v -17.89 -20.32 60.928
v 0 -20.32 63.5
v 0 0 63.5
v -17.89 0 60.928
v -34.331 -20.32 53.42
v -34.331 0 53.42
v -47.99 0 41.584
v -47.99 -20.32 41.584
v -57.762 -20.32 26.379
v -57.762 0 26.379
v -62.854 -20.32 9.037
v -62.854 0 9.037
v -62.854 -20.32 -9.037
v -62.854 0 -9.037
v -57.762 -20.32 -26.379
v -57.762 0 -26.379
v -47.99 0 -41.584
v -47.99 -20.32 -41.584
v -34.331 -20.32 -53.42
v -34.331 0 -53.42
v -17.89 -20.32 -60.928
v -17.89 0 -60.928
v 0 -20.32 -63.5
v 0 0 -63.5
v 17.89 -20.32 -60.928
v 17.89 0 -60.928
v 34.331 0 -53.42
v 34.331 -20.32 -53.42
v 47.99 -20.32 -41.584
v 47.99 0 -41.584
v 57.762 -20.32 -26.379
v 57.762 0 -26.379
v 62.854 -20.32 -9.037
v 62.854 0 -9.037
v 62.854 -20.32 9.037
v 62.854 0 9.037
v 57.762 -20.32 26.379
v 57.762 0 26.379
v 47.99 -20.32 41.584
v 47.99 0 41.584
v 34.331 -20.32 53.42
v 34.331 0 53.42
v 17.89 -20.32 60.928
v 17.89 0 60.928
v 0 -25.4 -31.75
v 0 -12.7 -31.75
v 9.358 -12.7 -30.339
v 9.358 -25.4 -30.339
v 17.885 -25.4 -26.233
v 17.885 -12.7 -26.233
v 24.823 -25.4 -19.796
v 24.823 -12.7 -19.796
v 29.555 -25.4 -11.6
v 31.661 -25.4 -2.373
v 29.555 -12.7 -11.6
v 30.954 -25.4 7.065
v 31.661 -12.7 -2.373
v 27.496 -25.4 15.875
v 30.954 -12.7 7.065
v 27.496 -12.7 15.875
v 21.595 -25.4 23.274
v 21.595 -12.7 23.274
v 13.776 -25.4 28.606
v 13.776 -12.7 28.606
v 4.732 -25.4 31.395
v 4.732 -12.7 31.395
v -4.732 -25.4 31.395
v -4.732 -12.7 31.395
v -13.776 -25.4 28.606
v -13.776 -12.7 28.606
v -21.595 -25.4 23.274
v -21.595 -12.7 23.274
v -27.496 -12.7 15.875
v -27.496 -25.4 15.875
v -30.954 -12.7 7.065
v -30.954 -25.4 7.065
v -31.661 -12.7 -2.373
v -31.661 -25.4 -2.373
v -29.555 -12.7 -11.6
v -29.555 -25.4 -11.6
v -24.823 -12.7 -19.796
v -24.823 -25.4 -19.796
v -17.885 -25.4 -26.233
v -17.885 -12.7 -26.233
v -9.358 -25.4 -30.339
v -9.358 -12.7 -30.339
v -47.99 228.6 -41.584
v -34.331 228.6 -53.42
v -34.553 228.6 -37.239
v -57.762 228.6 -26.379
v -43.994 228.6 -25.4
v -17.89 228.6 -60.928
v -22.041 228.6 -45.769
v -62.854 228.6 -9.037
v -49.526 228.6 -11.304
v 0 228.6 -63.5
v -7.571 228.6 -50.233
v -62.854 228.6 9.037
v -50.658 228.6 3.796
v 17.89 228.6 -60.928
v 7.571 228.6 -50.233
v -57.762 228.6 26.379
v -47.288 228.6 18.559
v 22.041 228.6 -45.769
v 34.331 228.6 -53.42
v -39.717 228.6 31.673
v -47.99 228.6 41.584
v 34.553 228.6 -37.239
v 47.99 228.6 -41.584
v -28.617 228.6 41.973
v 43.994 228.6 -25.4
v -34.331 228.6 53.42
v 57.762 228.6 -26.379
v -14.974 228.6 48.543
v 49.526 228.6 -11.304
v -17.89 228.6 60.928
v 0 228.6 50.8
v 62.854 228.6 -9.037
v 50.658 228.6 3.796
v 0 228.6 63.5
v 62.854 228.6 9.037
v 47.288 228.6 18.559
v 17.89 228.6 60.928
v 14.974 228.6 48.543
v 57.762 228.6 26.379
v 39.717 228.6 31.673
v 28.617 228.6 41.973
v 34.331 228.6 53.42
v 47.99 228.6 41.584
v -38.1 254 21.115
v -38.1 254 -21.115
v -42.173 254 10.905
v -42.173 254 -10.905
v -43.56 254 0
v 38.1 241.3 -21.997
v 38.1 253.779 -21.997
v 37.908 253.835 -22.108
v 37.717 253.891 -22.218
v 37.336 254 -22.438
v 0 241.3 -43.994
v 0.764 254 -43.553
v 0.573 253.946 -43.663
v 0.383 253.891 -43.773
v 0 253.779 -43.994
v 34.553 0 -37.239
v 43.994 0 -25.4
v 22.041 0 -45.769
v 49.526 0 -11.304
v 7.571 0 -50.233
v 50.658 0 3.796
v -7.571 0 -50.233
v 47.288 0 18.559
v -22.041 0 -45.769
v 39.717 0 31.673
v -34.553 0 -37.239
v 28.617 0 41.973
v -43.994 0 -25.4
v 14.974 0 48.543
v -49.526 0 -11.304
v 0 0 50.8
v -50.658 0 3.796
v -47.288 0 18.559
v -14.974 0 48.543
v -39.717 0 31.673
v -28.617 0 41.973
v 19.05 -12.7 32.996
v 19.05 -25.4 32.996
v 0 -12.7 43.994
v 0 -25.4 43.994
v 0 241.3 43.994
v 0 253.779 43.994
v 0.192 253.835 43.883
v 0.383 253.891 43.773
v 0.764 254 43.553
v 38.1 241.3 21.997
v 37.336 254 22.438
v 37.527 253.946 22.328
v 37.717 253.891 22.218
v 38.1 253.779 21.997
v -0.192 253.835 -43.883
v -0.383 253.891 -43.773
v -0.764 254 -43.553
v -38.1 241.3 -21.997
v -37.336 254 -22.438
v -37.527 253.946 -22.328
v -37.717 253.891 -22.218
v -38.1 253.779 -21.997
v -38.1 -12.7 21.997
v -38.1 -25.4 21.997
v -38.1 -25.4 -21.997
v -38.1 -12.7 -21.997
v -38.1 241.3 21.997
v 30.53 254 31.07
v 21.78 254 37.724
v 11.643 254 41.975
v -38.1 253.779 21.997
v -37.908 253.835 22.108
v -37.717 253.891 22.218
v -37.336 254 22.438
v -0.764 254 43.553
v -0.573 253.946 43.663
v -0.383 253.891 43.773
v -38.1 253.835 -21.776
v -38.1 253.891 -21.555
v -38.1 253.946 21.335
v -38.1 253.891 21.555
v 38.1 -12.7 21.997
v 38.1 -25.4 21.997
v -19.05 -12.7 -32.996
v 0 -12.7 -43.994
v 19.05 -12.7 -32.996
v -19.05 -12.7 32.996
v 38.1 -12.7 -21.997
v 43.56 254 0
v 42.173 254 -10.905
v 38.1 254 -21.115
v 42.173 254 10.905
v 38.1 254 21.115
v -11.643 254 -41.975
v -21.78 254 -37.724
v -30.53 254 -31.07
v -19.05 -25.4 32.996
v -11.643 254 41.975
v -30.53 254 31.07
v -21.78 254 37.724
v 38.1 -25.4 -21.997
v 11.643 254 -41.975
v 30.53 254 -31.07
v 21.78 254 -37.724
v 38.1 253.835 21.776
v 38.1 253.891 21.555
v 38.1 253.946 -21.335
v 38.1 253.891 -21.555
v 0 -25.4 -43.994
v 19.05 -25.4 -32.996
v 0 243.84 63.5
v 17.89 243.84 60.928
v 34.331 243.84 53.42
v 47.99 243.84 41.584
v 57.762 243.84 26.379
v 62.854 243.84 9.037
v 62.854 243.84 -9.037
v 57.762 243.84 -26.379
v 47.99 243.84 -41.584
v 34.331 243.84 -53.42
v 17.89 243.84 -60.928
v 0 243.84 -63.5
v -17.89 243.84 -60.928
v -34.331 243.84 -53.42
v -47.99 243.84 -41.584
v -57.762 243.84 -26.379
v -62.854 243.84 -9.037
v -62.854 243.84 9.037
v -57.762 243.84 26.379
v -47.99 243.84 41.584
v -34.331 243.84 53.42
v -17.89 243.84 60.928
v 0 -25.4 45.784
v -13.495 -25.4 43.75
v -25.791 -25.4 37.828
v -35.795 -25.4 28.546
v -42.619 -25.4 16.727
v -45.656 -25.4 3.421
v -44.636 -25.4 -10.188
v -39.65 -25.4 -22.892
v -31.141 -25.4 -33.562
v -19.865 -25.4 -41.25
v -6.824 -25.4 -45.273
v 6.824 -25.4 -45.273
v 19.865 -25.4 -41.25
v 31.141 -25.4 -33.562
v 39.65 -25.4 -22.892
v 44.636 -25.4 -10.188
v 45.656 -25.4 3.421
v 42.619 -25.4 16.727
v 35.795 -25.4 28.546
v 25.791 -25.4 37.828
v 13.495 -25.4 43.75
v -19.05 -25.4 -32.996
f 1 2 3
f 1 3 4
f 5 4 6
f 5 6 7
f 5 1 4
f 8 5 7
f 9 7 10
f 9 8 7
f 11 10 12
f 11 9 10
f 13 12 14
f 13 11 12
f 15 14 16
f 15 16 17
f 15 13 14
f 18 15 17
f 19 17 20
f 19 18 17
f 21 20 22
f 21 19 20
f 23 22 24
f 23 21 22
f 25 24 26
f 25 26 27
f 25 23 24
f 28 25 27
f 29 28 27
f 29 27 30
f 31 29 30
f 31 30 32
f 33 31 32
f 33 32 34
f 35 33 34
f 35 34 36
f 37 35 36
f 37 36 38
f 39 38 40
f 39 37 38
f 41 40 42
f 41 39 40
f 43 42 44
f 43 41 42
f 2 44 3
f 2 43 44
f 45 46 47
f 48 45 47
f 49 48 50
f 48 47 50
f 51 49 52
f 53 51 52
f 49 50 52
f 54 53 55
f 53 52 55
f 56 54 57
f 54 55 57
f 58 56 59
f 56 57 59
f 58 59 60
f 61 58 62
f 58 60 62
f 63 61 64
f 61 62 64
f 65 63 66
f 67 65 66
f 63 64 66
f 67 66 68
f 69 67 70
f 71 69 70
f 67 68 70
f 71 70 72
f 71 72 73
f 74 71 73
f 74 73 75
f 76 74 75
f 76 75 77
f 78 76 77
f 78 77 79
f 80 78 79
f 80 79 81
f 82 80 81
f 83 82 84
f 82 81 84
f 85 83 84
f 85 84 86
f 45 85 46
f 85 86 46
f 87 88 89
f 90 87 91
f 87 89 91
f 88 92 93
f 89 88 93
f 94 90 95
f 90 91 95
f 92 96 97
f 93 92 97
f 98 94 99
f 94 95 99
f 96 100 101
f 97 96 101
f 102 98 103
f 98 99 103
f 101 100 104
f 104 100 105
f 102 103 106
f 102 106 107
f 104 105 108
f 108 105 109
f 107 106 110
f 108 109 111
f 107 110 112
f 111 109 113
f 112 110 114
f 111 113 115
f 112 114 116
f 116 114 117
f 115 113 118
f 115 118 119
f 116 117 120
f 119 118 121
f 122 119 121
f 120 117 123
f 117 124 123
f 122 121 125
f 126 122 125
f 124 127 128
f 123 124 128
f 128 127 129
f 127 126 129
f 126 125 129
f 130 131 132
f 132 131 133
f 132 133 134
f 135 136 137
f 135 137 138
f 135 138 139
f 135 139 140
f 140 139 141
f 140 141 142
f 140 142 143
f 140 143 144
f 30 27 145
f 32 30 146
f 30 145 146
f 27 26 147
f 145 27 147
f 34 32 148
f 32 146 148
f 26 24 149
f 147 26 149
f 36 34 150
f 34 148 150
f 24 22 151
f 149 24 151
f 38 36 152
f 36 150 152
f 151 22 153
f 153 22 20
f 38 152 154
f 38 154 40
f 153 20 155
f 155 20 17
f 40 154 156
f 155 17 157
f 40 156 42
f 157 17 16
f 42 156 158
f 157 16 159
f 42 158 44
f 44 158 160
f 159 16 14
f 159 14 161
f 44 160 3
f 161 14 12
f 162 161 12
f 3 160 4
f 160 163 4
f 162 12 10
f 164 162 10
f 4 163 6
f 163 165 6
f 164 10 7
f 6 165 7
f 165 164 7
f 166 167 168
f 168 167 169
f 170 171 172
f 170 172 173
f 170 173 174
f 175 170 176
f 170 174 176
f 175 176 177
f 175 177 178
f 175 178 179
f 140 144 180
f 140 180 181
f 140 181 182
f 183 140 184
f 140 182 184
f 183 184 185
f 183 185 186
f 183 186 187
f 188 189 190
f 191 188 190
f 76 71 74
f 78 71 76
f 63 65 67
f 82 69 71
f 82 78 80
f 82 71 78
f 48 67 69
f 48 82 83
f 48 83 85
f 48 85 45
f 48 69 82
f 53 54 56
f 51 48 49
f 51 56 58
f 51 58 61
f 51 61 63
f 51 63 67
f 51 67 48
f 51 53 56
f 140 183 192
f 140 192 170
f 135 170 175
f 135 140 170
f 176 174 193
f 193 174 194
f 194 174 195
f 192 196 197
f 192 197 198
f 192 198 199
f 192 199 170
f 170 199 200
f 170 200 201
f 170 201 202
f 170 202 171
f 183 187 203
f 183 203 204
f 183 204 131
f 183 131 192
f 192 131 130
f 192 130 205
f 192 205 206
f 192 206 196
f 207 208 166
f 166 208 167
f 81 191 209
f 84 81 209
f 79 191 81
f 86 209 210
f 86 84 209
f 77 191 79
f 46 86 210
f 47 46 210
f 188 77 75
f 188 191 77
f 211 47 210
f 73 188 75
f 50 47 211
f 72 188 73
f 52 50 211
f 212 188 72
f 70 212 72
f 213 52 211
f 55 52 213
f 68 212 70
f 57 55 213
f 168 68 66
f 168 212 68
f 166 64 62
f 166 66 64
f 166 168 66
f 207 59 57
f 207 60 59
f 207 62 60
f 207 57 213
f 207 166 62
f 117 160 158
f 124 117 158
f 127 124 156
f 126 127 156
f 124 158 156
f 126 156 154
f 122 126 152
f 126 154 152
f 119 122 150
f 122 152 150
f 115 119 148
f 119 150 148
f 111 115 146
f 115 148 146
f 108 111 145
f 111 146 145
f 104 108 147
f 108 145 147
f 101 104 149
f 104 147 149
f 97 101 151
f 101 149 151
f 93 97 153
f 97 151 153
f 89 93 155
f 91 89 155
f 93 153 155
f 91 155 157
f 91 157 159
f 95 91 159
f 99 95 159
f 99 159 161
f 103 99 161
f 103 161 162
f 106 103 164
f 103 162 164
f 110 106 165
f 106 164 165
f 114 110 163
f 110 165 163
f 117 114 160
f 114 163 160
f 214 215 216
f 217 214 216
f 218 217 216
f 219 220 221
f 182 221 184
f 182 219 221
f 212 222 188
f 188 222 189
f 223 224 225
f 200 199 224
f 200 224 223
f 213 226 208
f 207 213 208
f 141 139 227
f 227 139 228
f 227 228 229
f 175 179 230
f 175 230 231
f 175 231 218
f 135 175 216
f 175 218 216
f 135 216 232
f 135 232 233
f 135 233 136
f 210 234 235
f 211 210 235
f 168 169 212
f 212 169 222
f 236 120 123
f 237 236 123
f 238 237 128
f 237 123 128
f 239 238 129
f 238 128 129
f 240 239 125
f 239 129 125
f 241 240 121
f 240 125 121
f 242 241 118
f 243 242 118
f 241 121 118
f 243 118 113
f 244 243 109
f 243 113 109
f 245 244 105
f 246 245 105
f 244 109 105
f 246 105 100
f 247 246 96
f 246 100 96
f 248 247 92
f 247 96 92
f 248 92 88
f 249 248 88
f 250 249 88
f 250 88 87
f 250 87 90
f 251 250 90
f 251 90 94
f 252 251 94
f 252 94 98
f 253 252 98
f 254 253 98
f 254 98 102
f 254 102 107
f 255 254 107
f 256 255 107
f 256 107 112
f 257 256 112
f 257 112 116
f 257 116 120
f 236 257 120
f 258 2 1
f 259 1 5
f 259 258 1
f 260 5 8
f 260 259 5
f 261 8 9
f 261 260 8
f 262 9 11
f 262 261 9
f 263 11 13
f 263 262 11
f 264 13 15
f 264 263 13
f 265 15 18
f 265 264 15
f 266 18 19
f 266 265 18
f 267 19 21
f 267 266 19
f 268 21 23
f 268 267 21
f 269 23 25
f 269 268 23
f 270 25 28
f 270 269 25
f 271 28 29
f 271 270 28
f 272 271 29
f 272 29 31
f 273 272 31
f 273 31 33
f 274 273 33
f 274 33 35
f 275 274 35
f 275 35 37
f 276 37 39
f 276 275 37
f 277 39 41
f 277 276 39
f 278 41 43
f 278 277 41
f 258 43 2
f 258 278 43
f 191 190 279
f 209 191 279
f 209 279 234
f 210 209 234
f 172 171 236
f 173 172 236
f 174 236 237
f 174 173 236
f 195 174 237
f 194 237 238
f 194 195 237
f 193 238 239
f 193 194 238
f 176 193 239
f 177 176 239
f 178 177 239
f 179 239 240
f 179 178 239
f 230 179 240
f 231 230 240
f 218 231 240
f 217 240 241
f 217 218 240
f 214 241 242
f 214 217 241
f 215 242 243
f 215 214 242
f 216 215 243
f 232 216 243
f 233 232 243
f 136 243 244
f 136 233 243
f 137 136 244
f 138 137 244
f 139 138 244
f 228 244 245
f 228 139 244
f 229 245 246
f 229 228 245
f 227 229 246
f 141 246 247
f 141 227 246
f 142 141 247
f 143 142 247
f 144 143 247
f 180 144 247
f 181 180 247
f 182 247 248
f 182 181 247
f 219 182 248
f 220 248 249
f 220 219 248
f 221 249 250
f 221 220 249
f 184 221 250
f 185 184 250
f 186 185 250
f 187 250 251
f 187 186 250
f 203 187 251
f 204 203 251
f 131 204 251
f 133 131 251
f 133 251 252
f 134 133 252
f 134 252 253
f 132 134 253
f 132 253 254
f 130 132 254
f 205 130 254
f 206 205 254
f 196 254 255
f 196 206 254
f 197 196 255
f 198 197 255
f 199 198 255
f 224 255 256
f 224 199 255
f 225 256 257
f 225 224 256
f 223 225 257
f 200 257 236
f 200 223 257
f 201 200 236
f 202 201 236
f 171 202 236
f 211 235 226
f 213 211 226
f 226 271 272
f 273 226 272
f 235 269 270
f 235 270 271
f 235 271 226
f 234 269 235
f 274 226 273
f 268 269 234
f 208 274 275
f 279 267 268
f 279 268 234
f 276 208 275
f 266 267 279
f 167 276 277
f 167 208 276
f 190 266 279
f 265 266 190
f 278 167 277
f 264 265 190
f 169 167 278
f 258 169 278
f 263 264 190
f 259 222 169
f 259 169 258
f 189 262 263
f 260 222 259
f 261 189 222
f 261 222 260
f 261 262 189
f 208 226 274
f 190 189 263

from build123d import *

# Parameters (mm, degrees)
SKETCH1_R           = 50.8
BOSS_EXTRUDE1_DEPTH = 228.6
SKETCH2_R           = 63.5
BOSS_EXTRUDE2_DEPTH = 25.4
BOSS_EXTRUDE3_START = 25.4
SKETCH3_R           = 63.5
BOSS_EXTRUDE3_DEPTH = 25.4
CUT_EXTRUDE2_DEPTH  = 12.7
CHAMFER2_SIZE       = 10.16
CHAMFER2_SIZE_2     = 19.940122736
SKETCH5_R           = 38.1
CUT_EXTRUDE5_DEPTH  = 12.7
CHAMFER3_SIZE       = 5.08
CHAMFER3_SIZE2      = 17.716065375
SKETCH6_R           = 31.75
BOSS_EXTRUDE6_DEPTH = 12.7


with BuildPart() as part:
    # Sketch1 → Boss-Extrude1 (new body)
    with BuildSketch(Plane(origin=(0, 0, 0), x_dir=(1, 0, 0), z_dir=(0, 1, 0))):
        with Locations(Location((0, 0, 0), (0, 0, 270))):
            Circle(SKETCH1_R)
    extrude(amount=BOSS_EXTRUDE1_DEPTH)

    # Sketch2 → Boss-Extrude2 (add)
    with BuildSketch(Plane(origin=(0, 228.6, 0), x_dir=(1, 0, 0), z_dir=(0, 1, 0))):
        with Locations(Location((0, 0, 0), (0, 0, 270))):
            Circle(SKETCH2_R)
    extrude(amount=BOSS_EXTRUDE2_DEPTH)

    # Sketch3 → Boss-Extrude3 (add)
    with BuildSketch(Plane.XZ.offset(BOSS_EXTRUDE3_START)):
        with Locations(Location((0, 0, 0), (0, 0, 90))):
            Circle(SKETCH3_R)
    extrude(amount=-BOSS_EXTRUDE3_DEPTH)

    # Sketch4 → Cut-Extrude2 (cut)
    with BuildSketch(Plane(origin=(0, 254, 0), x_dir=(1, 0, 0), z_dir=(0, 1, 0))):
        Polygon((0, 43.994090512), (-38.1, 21.997045256), (-38.1, -21.997045256), (0, -43.994090512), (38.1, -21.997045256), (38.1, 21.997045256), align=None)
    extrude(amount=-CUT_EXTRUDE2_DEPTH, mode=Mode.SUBTRACT)

    # Chamfer2
    # the kernel refuses this chamfer: 19.940122736, 10.16 mm, written as the material it takes off along each edge
    with BuildSketch(Plane(origin=(0, 254, 0), x_dir=(0, 0, 1), z_dir=(-1, 0, 0))) as chamfer2_piece_1:
        Polygon((63.5, -CHAMFER2_SIZE), (63.5 - CHAMFER2_SIZE_2, 0), (63.5, 0), align=None)
    revolve(axis=Axis((0, 254, 0), (0, 1, 0)), mode=Mode.SUBTRACT)

    # Sketch5 → Cut-Extrude5 (cut)
    with BuildSketch(Plane.XZ.offset(25.4)):
        Circle(SKETCH5_R)
        with BuildLine():
            Line((19.049999468, 32.995568191), (0, 43.994090512))
            Line((0, 43.994090512), (-19.04999937, 32.995568248))
            ThreePointArc((-19.04999937, 32.995568248), (5.7e-08, 38.1), (19.049999468, 32.995568191))
        make_face()
        with BuildLine():
            Line((38.1, 21.997045256), (19.049999468, 32.995568191))
            ThreePointArc((19.049999468, 32.995568191), (32.995567731, 19.050000266), (38.1, 0))
            Line((38.1, 0), (38.1, 21.997045256))
        make_face()
        with BuildLine():
            ThreePointArc((-38.1, -1.79e-07), (-32.995567747, 19.050000238), (-19.04999937, 32.995568248))
            Line((-19.04999937, 32.995568248), (-38.1, 21.997045256))
            Line((-38.1, 21.997045256), (-38.1, -1.79e-07))
        make_face()
        with BuildLine():
            ThreePointArc((-19.049999051, -32.995568432), (-32.995567566, -19.050000552), (-38.1, -1.79e-07))
            Line((-38.1, -1.79e-07), (-38.1, -21.997045256))
            Line((-38.1, -21.997045256), (-19.049999051, -32.995568432))
        make_face()
        with BuildLine():
            Line((38.1, -21.997045256), (38.1, 0))
            ThreePointArc((38.1, 0), (32.995567731, -19.050000266), (19.049999468, -32.995568191))
            Line((19.049999468, -32.995568191), (38.1, -21.997045256))
        make_face()
        with BuildLine():
            ThreePointArc((19.049999468, -32.995568191), (2.4e-07, -38.1), (-19.049999051, -32.995568432))
            Line((-19.049999051, -32.995568432), (0, -43.994090512))
            Line((0, -43.994090512), (19.049999468, -32.995568191))
        make_face()
    extrude(amount=-CUT_EXTRUDE5_DEPTH, mode=Mode.SUBTRACT)

    # Chamfer3
    chamfer3_edges = [part.edges().sort_by_distance(p)[0] for p in [
        (0, -25.4, -63.5),
    ]]
    chamfer3_side = [part.faces().sort_by_distance(p)[0] for p in [
        (0, -12.7, -63.5),
    ]]
    chamfer(chamfer3_edges, length=CHAMFER3_SIZE, length2=CHAMFER3_SIZE2, reference=chamfer3_side[0])

    # Sketch6 → Boss-Extrude6 (add)
    with BuildSketch(Plane.XZ.offset(12.7)):
        with Locations(Location((0, 0, 0), (0, 0, 270))):
            Circle(SKETCH6_R)
    extrude(amount=BOSS_EXTRUDE6_DEPTH)


solid = part.part
